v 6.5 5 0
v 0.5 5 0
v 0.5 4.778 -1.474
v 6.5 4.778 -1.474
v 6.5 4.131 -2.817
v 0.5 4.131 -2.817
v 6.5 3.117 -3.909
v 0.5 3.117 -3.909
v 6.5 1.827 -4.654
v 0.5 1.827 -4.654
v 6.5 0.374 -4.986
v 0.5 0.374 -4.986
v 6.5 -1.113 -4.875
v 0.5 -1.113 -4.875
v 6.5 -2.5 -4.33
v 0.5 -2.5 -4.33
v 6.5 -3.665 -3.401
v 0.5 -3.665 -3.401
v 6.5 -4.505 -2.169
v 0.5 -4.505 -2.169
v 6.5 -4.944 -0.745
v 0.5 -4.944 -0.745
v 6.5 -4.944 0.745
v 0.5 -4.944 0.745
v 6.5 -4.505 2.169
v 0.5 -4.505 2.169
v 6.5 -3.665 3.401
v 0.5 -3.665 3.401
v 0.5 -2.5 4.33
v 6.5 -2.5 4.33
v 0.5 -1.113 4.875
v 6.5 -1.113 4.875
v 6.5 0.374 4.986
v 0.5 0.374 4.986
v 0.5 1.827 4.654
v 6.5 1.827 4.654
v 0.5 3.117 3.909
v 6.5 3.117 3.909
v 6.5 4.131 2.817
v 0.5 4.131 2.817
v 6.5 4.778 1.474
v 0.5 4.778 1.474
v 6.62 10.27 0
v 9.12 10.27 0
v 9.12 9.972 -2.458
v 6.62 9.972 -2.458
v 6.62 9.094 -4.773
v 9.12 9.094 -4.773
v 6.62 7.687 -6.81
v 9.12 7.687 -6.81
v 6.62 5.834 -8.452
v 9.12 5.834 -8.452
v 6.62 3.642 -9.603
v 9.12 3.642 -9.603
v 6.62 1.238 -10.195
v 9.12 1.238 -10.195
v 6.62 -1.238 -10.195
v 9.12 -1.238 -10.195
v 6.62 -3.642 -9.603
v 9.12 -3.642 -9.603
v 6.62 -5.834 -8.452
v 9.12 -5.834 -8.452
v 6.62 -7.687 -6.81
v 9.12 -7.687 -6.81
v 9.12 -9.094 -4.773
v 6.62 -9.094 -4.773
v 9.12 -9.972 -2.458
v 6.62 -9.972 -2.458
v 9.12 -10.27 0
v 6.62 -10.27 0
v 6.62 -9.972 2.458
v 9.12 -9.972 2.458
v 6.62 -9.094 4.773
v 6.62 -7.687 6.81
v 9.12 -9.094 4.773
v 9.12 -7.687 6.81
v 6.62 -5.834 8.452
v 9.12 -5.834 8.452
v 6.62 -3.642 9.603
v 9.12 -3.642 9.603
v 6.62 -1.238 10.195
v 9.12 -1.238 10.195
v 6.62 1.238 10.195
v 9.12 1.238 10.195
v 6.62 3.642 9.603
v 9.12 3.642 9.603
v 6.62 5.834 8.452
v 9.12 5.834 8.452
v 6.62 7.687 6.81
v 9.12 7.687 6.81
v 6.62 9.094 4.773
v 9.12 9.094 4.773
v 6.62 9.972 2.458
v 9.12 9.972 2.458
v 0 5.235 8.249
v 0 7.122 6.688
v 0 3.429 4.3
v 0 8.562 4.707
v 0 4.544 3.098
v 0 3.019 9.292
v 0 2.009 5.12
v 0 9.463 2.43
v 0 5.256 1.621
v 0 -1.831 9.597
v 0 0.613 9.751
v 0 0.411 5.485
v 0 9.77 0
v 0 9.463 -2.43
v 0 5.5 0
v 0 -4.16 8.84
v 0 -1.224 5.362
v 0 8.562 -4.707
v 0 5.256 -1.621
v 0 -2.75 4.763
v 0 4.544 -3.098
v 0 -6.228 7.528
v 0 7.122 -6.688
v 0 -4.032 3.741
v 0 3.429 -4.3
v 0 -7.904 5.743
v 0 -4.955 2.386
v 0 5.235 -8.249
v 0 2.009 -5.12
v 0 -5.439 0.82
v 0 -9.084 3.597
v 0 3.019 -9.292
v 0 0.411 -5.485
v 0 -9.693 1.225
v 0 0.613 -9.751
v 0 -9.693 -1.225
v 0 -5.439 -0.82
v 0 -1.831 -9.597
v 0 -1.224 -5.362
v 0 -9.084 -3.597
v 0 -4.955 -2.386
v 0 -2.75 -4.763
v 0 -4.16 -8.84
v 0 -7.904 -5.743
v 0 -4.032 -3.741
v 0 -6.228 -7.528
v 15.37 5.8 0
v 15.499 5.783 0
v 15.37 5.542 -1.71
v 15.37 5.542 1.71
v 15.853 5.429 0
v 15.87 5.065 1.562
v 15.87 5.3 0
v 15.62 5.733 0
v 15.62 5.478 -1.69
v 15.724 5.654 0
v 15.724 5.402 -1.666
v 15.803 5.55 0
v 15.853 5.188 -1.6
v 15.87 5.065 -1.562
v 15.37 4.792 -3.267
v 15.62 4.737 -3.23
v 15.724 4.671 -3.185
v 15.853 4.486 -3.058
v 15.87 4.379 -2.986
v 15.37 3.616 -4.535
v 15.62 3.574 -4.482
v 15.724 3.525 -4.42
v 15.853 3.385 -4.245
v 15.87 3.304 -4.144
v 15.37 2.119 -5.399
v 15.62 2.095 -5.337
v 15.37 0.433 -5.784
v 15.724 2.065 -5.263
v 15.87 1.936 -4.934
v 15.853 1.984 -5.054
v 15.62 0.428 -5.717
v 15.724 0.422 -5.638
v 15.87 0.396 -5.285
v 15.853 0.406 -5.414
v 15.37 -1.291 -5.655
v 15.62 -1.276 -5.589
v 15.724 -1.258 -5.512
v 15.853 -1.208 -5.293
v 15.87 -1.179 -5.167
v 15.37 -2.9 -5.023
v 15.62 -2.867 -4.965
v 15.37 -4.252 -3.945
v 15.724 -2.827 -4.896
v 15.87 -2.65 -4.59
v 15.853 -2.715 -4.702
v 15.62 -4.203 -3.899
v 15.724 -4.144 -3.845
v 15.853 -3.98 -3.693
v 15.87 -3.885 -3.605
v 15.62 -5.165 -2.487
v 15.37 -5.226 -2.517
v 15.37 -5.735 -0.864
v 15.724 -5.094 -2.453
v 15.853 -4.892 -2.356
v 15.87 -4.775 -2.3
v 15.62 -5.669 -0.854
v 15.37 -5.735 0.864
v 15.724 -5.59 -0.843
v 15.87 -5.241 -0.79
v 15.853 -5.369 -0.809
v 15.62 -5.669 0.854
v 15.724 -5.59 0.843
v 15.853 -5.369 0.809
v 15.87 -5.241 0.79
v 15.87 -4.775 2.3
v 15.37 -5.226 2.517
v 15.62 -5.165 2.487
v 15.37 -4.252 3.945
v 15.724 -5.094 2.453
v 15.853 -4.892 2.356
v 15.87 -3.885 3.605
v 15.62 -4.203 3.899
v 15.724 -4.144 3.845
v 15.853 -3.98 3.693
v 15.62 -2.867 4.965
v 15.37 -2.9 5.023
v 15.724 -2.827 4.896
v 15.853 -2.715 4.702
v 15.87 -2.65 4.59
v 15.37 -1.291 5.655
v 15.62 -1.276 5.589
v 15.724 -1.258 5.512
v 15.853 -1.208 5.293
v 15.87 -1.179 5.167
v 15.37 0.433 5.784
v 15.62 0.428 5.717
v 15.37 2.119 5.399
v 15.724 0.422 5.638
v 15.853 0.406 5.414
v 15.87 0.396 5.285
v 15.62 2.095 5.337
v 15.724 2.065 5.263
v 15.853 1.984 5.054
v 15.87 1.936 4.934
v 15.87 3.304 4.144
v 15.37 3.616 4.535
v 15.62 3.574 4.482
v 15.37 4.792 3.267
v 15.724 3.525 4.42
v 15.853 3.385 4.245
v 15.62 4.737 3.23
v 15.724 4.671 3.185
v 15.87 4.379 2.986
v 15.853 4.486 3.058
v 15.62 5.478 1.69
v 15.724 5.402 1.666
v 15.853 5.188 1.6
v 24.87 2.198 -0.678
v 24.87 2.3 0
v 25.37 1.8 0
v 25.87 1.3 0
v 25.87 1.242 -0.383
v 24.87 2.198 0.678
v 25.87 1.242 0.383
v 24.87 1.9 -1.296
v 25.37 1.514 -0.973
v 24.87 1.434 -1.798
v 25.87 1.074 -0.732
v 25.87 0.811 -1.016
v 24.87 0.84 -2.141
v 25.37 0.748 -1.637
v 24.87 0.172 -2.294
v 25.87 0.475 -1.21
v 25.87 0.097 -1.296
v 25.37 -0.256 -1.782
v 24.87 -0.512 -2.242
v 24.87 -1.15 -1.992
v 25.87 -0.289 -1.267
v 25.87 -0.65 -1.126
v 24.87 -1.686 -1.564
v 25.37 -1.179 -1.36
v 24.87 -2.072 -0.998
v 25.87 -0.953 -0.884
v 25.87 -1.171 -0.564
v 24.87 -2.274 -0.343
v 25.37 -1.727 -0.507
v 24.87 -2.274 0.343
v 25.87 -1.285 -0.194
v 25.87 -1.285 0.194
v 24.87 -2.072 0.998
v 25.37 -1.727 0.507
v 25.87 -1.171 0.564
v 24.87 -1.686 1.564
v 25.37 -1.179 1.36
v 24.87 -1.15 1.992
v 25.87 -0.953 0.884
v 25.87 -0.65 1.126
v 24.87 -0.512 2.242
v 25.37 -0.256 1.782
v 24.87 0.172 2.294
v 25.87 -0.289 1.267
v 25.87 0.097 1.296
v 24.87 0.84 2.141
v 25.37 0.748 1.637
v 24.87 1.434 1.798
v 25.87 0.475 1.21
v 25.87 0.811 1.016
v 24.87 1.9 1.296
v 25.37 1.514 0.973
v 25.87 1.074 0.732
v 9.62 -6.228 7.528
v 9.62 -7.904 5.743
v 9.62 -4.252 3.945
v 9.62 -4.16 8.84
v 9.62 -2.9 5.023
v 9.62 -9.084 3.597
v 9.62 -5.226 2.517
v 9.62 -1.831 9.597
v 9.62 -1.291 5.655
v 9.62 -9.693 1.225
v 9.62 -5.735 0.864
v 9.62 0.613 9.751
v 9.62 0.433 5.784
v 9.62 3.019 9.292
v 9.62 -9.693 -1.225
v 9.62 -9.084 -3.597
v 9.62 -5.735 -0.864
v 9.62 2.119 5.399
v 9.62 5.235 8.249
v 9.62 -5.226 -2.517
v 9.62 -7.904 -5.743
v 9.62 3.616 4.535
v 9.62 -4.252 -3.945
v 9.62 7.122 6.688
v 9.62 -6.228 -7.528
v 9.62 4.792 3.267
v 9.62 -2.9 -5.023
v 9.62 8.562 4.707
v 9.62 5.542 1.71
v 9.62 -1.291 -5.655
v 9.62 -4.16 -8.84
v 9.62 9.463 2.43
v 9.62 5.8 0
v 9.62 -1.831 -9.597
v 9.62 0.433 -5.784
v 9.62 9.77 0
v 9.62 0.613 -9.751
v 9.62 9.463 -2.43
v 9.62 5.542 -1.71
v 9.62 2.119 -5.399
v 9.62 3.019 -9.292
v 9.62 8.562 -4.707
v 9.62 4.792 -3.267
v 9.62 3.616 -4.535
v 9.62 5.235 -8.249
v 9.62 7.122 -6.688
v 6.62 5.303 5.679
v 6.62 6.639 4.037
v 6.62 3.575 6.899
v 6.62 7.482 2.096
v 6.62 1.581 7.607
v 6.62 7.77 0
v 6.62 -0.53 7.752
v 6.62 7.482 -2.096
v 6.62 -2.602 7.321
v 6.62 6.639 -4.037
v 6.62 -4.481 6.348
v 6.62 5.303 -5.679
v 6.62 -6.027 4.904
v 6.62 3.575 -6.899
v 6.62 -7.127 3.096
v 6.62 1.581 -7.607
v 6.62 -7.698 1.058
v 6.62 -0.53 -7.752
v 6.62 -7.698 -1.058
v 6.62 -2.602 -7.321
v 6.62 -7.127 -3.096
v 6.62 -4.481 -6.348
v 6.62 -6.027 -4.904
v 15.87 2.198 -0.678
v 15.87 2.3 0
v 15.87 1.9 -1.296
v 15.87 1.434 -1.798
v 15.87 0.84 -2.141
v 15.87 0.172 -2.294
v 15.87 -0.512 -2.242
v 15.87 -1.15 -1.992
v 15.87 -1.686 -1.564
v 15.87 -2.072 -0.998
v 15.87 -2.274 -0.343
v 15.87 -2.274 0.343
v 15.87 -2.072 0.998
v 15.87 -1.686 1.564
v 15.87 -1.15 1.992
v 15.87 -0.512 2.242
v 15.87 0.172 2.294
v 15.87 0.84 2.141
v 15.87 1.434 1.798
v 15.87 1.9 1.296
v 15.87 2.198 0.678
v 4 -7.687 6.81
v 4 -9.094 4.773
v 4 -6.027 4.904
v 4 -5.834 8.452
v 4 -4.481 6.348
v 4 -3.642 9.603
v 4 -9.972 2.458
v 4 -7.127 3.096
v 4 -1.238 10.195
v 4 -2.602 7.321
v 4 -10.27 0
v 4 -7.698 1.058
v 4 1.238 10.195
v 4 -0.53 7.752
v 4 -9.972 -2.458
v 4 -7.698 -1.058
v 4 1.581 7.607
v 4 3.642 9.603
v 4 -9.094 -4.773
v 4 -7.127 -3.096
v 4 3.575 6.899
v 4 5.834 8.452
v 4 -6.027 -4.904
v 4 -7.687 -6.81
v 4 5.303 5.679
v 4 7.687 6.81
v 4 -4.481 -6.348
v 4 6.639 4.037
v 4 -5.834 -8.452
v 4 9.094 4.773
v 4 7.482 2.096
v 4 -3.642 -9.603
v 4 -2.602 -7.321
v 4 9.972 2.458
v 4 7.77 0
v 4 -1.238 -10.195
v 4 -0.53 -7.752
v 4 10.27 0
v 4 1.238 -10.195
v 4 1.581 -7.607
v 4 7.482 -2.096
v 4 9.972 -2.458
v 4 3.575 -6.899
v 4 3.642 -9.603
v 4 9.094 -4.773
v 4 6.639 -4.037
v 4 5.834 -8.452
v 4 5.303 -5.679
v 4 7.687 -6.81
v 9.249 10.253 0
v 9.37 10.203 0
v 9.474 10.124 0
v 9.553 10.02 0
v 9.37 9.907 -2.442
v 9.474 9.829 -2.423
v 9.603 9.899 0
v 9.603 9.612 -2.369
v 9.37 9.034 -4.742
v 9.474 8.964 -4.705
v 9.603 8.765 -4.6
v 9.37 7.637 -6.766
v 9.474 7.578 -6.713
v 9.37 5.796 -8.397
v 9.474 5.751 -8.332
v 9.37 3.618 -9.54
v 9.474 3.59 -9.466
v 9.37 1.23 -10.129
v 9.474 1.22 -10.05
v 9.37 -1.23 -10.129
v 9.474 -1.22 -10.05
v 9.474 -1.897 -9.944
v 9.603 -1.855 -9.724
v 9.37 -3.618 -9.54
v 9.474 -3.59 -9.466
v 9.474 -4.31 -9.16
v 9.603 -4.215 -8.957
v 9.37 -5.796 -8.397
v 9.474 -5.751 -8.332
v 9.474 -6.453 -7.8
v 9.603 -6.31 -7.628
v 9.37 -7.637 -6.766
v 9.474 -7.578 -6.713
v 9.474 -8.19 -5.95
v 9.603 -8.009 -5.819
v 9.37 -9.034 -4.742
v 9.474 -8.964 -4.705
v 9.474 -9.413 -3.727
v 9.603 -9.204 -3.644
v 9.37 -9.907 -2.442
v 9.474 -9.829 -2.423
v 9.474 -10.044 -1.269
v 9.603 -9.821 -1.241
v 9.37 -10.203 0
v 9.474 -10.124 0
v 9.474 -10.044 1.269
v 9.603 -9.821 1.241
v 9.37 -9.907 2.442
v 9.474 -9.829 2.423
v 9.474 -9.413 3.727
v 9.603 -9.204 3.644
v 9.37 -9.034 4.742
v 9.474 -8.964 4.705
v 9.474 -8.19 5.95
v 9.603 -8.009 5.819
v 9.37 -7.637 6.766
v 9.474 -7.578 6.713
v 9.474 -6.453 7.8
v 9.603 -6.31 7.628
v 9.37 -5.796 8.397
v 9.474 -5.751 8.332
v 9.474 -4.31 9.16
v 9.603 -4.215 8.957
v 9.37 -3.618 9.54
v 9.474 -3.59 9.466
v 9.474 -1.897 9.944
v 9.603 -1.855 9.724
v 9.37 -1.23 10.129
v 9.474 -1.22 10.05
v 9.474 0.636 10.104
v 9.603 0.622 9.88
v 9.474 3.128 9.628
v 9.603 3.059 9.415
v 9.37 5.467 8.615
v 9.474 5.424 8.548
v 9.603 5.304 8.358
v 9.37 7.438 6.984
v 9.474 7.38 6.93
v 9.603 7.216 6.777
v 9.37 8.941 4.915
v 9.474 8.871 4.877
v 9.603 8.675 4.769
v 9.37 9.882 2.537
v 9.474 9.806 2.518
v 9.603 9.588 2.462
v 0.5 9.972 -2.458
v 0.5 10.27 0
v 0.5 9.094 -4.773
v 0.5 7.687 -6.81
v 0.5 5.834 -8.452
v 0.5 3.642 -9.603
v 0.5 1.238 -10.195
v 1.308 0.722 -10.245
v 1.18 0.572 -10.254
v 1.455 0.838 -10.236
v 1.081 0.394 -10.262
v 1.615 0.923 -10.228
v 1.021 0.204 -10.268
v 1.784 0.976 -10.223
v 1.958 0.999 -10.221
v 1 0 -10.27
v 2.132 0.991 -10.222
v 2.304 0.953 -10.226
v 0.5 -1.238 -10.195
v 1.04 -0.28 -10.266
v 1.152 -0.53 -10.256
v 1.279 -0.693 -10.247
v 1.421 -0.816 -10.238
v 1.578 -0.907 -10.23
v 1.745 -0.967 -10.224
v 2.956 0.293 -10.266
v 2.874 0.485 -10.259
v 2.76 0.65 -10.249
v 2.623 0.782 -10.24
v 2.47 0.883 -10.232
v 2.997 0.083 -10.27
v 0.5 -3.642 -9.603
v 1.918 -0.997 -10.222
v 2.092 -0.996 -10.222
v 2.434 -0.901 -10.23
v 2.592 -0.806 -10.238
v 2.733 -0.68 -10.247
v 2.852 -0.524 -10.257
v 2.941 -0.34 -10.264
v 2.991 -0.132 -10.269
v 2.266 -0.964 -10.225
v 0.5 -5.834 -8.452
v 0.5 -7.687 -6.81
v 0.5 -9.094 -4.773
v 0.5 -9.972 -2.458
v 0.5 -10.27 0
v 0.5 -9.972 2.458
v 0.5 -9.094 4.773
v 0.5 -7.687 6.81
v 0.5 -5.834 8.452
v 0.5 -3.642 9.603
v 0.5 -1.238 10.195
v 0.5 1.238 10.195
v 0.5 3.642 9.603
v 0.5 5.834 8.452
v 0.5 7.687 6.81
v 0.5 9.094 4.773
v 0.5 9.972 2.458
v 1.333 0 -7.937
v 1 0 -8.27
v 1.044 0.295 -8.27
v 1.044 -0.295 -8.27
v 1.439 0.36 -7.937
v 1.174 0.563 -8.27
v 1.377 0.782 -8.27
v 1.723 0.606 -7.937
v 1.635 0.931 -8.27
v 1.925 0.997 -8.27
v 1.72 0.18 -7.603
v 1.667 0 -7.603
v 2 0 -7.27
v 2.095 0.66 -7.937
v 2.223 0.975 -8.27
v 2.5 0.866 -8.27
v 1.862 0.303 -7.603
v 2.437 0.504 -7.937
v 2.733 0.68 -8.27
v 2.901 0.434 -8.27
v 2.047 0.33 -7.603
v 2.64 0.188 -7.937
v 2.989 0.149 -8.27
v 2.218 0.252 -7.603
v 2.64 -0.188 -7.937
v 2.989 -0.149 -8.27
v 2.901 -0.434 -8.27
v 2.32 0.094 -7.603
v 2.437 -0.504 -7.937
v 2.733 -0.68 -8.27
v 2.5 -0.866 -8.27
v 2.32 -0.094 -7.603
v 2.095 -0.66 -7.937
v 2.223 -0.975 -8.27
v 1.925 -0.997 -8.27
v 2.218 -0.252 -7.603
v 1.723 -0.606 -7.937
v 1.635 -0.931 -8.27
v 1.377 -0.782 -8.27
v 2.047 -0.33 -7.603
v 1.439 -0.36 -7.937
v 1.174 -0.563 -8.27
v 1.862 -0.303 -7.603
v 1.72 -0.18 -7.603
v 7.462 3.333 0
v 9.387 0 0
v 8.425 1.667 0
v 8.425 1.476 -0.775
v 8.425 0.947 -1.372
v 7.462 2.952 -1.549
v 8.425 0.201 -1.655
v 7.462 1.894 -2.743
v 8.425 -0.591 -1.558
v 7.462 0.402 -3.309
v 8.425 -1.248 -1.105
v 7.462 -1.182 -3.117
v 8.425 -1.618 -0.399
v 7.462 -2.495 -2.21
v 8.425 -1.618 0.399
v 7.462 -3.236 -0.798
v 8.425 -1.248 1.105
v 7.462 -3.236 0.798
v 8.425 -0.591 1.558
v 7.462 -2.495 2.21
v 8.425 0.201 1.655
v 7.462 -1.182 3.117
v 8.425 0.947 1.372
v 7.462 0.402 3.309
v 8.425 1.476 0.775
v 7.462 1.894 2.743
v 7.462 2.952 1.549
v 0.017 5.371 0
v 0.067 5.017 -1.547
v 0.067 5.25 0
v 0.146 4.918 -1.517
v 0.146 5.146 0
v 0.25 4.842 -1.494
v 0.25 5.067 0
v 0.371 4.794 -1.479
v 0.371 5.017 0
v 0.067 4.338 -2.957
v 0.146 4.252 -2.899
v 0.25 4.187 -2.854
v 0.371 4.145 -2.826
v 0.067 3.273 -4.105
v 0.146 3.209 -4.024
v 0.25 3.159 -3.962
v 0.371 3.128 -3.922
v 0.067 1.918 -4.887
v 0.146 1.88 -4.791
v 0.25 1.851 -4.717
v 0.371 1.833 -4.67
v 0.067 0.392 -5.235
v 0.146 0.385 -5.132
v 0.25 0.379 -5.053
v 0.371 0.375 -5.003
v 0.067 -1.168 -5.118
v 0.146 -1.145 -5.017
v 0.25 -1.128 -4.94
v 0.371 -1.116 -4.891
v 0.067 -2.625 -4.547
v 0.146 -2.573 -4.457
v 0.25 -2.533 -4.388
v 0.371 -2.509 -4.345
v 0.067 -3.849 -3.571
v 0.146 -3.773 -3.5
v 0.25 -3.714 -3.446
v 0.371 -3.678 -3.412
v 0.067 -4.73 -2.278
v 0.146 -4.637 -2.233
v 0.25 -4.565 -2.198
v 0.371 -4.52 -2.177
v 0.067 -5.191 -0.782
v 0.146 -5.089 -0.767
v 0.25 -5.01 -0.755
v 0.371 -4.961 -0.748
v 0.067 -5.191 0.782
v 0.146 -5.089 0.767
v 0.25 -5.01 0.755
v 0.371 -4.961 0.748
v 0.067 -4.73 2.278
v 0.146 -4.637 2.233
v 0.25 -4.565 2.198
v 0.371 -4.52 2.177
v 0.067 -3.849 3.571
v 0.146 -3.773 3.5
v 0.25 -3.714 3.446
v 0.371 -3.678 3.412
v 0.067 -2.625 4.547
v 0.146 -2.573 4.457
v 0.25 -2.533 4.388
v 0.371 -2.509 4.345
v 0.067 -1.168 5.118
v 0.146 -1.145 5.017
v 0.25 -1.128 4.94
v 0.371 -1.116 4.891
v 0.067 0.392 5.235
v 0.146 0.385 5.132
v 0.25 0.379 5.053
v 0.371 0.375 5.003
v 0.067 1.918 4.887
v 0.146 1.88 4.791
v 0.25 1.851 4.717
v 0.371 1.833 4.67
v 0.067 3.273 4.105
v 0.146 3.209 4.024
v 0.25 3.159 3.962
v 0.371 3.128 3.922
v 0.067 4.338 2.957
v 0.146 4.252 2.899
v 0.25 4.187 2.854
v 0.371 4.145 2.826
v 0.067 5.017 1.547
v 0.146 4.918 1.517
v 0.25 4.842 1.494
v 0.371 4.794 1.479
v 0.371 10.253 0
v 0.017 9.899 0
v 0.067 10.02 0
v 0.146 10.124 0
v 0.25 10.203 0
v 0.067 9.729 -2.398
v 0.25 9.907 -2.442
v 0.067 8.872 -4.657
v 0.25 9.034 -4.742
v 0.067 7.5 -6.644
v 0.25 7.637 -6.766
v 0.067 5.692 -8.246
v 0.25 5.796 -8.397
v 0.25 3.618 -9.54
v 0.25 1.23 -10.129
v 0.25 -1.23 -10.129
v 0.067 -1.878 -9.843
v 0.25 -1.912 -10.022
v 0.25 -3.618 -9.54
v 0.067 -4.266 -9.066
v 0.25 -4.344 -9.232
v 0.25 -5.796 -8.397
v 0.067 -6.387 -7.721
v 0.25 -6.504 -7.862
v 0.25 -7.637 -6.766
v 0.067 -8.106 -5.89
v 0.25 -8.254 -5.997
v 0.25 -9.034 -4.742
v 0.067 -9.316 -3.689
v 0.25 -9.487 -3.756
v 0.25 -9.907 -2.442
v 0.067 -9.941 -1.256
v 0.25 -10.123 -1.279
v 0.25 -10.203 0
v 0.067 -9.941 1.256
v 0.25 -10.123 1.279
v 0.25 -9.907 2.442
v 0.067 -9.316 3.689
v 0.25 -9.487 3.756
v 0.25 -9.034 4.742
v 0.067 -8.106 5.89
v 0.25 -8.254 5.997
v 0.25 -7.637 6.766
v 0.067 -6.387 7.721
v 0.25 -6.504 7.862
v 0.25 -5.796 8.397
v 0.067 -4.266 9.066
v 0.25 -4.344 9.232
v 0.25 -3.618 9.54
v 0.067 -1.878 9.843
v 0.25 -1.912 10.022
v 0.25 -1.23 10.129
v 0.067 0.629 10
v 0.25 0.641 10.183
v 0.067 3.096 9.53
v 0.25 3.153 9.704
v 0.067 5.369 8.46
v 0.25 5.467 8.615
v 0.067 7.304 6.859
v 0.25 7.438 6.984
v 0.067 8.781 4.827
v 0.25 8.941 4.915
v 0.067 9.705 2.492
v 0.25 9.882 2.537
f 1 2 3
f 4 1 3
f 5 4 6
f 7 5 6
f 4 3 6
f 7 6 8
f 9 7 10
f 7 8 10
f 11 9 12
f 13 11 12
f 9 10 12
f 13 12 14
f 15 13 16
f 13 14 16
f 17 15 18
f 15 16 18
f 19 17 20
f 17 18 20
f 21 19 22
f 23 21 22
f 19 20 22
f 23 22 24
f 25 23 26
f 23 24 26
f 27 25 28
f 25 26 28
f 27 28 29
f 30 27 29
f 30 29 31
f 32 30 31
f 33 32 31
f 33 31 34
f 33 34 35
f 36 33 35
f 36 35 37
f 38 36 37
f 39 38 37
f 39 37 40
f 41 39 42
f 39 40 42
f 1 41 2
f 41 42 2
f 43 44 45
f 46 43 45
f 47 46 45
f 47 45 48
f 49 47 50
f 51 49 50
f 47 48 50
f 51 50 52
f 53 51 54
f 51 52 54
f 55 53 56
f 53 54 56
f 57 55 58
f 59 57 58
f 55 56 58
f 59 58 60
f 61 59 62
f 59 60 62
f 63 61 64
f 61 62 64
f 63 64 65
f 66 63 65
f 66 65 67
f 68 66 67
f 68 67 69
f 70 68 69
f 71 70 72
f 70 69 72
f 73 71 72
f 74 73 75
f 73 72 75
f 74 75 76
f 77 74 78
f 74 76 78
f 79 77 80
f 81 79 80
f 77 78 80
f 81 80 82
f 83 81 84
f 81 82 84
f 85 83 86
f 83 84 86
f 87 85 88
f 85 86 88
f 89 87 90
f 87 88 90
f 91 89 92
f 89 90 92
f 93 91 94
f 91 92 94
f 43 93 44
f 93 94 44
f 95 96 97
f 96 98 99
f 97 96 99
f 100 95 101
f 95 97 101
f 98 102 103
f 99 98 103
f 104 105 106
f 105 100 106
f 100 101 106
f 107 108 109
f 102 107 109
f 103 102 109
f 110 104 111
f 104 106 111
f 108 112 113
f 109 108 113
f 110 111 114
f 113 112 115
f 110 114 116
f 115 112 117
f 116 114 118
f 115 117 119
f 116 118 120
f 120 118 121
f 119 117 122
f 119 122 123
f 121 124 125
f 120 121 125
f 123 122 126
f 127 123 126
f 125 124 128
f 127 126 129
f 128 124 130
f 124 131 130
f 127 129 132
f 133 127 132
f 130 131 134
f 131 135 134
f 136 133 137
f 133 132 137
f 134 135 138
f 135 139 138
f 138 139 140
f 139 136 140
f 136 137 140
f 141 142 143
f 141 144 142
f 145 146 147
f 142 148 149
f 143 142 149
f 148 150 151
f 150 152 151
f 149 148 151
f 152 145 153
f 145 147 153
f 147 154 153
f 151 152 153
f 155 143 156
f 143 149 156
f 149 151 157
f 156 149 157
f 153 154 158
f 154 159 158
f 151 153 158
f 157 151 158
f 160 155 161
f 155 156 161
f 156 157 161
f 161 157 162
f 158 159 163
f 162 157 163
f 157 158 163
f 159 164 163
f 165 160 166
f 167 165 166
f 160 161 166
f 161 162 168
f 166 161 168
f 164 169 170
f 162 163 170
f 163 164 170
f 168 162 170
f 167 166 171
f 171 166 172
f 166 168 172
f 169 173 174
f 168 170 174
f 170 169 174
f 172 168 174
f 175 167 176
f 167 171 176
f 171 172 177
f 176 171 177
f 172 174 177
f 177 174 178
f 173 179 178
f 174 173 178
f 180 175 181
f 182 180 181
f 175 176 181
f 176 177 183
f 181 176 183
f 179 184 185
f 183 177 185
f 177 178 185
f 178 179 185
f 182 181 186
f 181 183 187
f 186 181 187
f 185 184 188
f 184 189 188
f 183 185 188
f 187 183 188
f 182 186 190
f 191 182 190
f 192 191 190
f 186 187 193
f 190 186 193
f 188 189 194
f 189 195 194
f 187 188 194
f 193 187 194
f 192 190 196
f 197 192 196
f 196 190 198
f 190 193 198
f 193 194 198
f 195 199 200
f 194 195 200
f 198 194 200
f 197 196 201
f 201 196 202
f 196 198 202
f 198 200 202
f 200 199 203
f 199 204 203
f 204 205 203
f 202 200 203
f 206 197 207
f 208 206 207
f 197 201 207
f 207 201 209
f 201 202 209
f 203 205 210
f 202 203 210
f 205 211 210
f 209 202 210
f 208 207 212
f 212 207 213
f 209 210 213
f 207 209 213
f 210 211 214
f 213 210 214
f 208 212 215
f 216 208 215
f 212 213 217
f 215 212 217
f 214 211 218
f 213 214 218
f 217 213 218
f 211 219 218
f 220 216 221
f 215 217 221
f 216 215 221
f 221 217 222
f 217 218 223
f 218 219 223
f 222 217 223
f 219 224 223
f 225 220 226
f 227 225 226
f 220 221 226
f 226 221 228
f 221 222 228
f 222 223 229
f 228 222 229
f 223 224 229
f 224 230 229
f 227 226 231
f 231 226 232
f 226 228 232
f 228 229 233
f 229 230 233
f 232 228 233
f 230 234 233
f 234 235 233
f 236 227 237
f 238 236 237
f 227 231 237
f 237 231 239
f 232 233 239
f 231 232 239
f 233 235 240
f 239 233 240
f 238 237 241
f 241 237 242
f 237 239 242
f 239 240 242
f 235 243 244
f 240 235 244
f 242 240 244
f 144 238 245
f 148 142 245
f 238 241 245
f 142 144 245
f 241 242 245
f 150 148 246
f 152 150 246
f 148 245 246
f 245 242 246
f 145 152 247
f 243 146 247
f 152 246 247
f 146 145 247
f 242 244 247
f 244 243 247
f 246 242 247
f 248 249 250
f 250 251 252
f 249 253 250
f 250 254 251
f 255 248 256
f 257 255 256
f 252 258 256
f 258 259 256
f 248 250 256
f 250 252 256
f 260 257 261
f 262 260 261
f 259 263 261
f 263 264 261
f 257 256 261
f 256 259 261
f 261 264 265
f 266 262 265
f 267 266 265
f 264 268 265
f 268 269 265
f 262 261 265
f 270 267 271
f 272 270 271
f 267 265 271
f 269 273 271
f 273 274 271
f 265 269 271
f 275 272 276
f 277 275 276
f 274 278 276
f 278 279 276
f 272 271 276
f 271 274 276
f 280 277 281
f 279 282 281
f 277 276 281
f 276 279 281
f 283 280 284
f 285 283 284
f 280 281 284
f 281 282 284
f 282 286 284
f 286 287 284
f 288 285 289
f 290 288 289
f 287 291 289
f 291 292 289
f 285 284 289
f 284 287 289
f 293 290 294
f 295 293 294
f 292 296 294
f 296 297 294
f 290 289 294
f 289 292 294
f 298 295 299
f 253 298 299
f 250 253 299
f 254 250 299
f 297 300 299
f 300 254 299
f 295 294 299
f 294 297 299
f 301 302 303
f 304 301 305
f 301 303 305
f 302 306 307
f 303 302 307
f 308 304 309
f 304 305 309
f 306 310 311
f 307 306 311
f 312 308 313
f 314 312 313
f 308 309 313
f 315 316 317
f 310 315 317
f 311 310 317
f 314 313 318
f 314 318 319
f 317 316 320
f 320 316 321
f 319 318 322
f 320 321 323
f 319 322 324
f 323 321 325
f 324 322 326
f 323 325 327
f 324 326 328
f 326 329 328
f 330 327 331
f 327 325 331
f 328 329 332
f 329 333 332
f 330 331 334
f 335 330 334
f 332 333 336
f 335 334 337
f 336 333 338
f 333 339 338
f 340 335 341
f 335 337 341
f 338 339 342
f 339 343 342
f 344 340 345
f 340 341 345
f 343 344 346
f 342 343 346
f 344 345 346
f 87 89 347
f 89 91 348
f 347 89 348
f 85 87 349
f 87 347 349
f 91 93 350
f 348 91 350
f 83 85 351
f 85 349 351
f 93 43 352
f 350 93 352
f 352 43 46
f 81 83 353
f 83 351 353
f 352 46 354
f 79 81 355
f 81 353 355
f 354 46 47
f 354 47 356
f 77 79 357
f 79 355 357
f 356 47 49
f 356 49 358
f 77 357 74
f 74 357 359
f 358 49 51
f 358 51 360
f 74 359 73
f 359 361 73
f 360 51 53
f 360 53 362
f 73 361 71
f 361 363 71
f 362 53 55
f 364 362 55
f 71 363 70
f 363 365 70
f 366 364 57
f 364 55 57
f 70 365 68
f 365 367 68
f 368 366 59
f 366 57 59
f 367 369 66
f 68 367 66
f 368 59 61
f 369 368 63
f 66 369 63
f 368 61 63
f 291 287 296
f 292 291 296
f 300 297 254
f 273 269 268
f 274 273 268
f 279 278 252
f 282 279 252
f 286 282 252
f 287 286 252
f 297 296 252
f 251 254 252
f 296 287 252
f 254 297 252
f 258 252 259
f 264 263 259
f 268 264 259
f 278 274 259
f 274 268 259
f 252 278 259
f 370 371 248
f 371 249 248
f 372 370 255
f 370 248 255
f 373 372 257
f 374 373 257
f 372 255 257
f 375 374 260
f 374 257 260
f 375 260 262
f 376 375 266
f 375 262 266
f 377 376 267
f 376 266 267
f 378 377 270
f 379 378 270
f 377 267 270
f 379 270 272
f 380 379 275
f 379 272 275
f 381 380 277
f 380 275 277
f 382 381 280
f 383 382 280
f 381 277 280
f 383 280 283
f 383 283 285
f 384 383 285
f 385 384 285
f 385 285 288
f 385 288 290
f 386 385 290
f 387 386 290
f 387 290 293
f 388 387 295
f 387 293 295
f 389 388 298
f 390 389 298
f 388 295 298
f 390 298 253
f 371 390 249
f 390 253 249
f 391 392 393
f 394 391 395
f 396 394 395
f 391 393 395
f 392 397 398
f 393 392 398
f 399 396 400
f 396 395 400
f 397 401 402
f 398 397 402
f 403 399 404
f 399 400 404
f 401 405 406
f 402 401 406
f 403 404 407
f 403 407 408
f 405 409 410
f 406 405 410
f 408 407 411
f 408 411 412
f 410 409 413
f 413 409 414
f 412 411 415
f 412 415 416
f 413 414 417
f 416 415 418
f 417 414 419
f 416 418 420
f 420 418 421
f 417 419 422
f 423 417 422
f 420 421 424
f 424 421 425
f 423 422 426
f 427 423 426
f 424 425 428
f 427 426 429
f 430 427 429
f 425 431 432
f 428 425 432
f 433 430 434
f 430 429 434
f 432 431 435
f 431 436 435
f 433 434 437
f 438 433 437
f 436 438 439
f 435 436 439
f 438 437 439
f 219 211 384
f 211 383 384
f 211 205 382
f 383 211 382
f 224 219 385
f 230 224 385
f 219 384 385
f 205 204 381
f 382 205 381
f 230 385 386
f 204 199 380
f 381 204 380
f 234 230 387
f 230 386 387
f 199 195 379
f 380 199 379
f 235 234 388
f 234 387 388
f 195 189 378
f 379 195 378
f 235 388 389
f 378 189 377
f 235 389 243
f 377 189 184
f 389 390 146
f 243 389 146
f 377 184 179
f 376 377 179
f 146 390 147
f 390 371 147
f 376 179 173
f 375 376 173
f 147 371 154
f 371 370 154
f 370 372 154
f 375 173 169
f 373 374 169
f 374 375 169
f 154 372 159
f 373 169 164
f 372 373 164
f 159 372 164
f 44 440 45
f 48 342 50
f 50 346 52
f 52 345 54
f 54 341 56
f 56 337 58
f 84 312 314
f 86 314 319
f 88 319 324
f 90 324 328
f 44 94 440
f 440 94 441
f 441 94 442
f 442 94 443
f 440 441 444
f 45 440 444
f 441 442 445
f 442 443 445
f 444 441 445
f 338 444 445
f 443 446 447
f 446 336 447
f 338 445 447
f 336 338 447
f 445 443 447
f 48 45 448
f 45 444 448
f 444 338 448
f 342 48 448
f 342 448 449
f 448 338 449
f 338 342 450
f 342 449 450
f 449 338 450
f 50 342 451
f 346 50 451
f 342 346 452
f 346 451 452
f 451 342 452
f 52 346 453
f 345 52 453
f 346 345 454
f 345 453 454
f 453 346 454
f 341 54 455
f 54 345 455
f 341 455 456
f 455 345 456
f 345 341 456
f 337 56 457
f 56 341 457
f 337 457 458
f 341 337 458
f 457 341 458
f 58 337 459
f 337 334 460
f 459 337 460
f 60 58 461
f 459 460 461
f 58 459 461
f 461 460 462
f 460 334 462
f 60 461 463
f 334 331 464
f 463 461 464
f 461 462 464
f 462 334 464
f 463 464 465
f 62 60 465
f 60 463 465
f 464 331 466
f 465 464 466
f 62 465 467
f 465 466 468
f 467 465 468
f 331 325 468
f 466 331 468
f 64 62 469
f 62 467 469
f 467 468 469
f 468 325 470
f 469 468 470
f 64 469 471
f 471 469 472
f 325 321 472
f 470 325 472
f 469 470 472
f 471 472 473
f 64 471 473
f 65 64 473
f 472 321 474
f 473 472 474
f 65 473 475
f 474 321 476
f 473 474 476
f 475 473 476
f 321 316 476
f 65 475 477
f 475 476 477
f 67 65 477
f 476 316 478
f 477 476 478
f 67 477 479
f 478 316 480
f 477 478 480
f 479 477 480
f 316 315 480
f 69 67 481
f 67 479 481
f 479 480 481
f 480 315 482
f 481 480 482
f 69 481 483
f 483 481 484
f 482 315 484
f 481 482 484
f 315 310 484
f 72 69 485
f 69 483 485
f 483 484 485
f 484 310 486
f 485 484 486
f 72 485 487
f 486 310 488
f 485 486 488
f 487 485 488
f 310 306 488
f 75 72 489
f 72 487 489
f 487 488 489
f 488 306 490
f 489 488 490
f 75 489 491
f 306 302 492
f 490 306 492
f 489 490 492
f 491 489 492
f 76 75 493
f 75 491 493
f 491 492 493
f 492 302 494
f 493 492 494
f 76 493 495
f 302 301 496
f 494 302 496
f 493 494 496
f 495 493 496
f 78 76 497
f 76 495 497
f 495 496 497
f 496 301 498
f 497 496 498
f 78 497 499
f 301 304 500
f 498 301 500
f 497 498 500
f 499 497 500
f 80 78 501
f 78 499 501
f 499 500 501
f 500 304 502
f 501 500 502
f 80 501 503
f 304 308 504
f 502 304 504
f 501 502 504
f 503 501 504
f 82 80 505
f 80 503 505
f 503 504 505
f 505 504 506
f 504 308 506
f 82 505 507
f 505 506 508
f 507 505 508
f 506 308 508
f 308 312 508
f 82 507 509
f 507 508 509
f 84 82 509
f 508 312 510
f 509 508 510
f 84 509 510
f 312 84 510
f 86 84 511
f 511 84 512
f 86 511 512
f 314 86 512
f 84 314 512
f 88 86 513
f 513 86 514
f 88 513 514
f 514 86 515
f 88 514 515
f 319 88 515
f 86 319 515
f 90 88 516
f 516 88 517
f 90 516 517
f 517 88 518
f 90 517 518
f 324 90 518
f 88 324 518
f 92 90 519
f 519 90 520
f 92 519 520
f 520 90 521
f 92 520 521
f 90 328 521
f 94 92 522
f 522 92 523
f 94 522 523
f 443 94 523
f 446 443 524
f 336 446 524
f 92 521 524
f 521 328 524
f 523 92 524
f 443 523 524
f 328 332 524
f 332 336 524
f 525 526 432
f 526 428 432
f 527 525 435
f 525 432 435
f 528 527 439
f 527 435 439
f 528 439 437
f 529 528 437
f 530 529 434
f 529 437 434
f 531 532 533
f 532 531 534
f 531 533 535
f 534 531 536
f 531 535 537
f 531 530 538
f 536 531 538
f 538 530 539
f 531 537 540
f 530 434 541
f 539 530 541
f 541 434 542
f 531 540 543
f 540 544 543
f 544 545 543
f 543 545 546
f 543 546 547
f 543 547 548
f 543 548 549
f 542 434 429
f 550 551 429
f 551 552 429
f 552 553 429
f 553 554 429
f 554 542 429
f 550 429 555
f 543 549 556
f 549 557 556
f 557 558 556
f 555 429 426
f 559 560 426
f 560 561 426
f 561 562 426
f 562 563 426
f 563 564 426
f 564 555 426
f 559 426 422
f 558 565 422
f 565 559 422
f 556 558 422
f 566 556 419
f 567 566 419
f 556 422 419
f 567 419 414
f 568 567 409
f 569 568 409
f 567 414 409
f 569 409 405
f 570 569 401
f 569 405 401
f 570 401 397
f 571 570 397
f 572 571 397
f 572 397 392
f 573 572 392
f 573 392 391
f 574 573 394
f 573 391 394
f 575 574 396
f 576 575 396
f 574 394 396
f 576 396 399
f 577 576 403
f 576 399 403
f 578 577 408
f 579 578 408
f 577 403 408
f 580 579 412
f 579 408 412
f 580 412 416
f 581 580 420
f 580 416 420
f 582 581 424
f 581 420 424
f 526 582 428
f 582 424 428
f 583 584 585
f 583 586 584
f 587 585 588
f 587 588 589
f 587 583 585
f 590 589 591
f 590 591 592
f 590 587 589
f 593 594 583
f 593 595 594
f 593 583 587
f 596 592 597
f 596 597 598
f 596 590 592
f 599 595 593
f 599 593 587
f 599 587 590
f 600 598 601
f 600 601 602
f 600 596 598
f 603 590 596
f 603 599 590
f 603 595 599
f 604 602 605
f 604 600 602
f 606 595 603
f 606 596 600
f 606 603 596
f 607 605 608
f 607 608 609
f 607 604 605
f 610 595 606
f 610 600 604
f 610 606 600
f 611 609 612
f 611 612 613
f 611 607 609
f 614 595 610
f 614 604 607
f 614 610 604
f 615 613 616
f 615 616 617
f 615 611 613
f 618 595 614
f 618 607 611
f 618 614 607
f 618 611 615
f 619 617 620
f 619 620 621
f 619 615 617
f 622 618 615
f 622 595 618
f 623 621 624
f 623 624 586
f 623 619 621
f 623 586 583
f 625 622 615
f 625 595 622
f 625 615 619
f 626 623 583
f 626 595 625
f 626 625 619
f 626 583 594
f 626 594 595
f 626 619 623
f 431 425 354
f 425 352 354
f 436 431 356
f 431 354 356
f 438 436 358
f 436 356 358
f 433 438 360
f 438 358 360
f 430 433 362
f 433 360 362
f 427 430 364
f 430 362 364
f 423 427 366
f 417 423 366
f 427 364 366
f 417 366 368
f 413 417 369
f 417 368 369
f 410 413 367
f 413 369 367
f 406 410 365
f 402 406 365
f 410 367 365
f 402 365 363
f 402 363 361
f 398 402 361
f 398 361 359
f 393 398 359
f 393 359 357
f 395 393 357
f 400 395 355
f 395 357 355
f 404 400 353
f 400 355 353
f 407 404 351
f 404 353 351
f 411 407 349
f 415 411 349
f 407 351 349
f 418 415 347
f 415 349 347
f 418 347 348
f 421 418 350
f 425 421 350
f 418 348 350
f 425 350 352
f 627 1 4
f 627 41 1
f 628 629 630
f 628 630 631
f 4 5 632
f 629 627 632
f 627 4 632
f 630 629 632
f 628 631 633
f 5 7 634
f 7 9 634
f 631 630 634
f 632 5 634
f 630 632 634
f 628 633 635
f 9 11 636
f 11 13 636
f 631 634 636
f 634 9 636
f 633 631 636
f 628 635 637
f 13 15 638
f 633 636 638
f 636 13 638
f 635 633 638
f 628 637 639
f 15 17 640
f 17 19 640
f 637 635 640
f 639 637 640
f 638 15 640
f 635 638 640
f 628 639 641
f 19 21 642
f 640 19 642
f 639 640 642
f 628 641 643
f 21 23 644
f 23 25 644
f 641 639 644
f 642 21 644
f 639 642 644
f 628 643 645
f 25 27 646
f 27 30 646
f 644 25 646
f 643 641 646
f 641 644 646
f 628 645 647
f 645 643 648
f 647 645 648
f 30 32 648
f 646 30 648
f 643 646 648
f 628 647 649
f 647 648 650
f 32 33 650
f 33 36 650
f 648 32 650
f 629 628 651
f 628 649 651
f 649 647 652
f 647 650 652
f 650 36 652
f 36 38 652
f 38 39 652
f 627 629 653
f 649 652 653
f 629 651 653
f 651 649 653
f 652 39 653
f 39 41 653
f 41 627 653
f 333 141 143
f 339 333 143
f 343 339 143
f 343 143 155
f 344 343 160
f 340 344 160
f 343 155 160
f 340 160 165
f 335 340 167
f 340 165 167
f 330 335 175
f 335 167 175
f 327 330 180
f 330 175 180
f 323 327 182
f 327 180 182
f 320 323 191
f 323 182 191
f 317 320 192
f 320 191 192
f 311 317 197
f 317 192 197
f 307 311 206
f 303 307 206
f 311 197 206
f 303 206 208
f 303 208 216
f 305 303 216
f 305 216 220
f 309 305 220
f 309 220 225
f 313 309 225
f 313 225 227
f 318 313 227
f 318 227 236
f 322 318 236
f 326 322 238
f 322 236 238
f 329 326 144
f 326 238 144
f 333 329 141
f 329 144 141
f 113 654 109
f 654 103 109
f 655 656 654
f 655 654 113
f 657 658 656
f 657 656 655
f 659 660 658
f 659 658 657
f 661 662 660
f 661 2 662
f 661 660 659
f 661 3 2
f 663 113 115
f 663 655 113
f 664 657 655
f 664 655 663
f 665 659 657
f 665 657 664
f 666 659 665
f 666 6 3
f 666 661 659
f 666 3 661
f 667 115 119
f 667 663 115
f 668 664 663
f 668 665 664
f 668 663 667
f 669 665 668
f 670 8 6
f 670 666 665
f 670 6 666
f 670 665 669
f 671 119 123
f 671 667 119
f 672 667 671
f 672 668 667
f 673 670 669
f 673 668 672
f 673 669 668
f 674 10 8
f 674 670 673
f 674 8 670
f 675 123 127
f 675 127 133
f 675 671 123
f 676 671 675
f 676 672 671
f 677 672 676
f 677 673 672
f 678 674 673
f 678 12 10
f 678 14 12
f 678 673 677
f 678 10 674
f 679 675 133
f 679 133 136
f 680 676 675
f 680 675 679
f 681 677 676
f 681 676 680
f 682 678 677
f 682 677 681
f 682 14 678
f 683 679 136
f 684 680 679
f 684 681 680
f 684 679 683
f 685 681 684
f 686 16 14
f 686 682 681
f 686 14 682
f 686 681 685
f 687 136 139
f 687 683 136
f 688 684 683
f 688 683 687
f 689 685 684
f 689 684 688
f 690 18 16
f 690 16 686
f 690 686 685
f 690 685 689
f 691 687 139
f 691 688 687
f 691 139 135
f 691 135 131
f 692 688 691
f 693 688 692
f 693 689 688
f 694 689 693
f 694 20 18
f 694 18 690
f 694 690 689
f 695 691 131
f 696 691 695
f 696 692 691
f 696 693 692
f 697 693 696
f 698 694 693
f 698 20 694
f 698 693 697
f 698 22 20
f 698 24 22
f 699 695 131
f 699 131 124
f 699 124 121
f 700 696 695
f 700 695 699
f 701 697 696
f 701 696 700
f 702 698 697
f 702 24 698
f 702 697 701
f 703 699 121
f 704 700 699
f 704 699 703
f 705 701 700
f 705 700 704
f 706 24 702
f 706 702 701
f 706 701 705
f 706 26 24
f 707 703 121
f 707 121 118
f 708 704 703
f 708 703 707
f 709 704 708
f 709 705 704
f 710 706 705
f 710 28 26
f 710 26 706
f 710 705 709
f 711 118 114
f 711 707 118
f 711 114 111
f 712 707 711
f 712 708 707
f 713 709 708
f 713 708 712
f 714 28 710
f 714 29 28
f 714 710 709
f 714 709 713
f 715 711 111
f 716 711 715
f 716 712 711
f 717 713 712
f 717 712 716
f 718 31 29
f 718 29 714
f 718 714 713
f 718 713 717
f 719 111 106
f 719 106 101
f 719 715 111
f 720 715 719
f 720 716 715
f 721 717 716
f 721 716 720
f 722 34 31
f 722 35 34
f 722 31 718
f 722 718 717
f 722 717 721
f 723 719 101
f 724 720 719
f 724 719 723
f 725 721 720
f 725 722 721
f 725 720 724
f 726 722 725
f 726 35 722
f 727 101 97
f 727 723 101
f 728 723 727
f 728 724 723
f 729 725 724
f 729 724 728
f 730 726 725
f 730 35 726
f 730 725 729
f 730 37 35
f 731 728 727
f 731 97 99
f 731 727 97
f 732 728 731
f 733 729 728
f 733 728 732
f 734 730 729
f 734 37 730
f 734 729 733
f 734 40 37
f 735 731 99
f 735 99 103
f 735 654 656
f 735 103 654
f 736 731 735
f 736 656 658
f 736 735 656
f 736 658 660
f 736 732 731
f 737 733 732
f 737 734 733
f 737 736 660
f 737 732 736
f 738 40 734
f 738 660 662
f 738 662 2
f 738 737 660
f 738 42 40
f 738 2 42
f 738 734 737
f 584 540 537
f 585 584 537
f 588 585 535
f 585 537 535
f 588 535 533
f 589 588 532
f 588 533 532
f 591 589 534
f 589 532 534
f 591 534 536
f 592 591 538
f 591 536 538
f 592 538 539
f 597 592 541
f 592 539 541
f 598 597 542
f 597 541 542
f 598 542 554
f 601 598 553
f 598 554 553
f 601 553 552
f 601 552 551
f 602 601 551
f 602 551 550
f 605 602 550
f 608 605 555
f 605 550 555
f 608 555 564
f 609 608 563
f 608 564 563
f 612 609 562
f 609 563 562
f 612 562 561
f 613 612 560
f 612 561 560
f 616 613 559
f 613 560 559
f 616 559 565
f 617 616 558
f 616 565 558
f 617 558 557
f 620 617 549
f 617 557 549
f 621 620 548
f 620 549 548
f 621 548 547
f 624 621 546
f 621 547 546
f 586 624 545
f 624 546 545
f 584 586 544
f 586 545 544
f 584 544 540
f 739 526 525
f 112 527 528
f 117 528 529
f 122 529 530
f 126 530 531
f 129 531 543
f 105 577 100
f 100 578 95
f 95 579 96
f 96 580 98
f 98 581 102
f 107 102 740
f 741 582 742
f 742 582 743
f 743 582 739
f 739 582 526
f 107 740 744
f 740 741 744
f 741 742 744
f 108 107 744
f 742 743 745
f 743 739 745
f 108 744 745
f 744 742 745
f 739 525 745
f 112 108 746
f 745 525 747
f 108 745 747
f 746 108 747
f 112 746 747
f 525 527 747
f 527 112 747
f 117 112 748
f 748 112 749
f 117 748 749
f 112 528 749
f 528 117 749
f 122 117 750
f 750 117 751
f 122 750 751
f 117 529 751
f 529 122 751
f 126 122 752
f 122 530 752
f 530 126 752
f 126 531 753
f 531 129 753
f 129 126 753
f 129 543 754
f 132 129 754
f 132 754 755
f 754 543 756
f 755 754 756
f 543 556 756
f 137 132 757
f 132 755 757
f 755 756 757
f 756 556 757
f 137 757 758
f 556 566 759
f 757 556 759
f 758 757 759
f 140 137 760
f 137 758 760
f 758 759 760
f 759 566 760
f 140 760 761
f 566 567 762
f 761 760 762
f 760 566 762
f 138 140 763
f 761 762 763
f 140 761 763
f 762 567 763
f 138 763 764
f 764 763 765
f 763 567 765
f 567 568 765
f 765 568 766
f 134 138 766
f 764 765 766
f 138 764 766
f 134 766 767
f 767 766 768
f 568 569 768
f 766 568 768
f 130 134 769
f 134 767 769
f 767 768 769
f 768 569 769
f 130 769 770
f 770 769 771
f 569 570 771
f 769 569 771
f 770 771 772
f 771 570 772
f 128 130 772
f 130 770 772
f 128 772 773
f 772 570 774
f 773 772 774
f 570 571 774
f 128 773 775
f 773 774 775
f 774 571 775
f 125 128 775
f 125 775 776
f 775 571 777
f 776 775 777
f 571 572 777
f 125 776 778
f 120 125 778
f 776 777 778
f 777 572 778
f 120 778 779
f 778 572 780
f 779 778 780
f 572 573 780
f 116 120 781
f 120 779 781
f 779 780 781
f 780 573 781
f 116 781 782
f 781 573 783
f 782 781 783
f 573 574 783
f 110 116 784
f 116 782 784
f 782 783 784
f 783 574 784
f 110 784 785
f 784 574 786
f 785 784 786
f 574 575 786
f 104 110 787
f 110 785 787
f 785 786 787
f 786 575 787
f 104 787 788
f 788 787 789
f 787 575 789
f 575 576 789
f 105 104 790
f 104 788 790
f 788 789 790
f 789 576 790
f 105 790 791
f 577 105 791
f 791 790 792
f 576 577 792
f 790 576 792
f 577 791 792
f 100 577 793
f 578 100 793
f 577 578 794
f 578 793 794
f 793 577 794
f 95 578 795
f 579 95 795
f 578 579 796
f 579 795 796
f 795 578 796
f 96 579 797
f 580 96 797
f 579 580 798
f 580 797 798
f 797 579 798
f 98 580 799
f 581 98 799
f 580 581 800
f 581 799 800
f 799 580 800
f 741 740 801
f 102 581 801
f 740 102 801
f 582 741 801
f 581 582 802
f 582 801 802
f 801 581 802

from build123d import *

# Parameters (mm, degrees)
FILETE2_R             = 0.5
FILETE3_R             = 0.5
FILETE4_R             = 0.5
FILETE5_R             = 0.5
ESBO_O5_R             = 1
CORTE_EXTRUS_O1_DEPTH = 3
CHANFRO1_SIZE         = 1


with BuildPart() as part:
    # Esboço1 → Revolução1 (revolve)
    with BuildSketch(Plane.XY):
        Polygon((0, 5), (0, 10.27), (4, 10.27), (4, 7.77), (6.62, 7.77), (6.62, 10.27), (9.62, 10.27), (9.62, 5.8), (15.87, 5.8), (15.87, 2.3), (24.87, 2.3), (25.87, 1.3), (25.87, 0), (9.386751346, 0), (6.5, 5), align=None)
    revolve(axis=Axis((25.87, 0, 0), (-1, 0, 0)))

    # Filete2
    filete2_edges = [part.edges().sort_by_distance(p)[0] for p in [
        (0, -5, 0),
    ]]
    fillet(filete2_edges, radius=FILETE2_R)

    # Filete3
    filete3_edges = [part.edges().sort_by_distance(p)[0] for p in [
        (0, -10.27, 0),
    ]]
    fillet(filete3_edges, radius=FILETE3_R)

    # Filete4
    filete4_edges = [part.edges().sort_by_distance(p)[0] for p in [
        (9.62, -10.27, 0),
    ]]
    fillet(filete4_edges, radius=FILETE4_R)

    # Filete5
    filete5_edges = [part.edges().sort_by_distance(p)[0] for p in [
        (15.87, -5.8, 0),
    ]]
    fillet(filete5_edges, radius=FILETE5_R)

    # Esboço5 → Corte-extrusão1 (cut)
    with BuildSketch(Plane(origin=(0, 0, -10.27), x_dir=(-1, 0, 0), z_dir=(0, 0, -1))):
        with Locations((-2, 0)):
            Circle(ESBO_O5_R)
    extrude(amount=-CORTE_EXTRUS_O1_DEPTH, mode=Mode.SUBTRACT)

    # Chanfro1
    chanfro1_edges = [part.edges().sort_by_distance(p)[0] for p in [
        (3, 0, -7.27),
    ]]
    chamfer(chanfro1_edges, length=CHANFRO1_SIZE)


solid = part.part
